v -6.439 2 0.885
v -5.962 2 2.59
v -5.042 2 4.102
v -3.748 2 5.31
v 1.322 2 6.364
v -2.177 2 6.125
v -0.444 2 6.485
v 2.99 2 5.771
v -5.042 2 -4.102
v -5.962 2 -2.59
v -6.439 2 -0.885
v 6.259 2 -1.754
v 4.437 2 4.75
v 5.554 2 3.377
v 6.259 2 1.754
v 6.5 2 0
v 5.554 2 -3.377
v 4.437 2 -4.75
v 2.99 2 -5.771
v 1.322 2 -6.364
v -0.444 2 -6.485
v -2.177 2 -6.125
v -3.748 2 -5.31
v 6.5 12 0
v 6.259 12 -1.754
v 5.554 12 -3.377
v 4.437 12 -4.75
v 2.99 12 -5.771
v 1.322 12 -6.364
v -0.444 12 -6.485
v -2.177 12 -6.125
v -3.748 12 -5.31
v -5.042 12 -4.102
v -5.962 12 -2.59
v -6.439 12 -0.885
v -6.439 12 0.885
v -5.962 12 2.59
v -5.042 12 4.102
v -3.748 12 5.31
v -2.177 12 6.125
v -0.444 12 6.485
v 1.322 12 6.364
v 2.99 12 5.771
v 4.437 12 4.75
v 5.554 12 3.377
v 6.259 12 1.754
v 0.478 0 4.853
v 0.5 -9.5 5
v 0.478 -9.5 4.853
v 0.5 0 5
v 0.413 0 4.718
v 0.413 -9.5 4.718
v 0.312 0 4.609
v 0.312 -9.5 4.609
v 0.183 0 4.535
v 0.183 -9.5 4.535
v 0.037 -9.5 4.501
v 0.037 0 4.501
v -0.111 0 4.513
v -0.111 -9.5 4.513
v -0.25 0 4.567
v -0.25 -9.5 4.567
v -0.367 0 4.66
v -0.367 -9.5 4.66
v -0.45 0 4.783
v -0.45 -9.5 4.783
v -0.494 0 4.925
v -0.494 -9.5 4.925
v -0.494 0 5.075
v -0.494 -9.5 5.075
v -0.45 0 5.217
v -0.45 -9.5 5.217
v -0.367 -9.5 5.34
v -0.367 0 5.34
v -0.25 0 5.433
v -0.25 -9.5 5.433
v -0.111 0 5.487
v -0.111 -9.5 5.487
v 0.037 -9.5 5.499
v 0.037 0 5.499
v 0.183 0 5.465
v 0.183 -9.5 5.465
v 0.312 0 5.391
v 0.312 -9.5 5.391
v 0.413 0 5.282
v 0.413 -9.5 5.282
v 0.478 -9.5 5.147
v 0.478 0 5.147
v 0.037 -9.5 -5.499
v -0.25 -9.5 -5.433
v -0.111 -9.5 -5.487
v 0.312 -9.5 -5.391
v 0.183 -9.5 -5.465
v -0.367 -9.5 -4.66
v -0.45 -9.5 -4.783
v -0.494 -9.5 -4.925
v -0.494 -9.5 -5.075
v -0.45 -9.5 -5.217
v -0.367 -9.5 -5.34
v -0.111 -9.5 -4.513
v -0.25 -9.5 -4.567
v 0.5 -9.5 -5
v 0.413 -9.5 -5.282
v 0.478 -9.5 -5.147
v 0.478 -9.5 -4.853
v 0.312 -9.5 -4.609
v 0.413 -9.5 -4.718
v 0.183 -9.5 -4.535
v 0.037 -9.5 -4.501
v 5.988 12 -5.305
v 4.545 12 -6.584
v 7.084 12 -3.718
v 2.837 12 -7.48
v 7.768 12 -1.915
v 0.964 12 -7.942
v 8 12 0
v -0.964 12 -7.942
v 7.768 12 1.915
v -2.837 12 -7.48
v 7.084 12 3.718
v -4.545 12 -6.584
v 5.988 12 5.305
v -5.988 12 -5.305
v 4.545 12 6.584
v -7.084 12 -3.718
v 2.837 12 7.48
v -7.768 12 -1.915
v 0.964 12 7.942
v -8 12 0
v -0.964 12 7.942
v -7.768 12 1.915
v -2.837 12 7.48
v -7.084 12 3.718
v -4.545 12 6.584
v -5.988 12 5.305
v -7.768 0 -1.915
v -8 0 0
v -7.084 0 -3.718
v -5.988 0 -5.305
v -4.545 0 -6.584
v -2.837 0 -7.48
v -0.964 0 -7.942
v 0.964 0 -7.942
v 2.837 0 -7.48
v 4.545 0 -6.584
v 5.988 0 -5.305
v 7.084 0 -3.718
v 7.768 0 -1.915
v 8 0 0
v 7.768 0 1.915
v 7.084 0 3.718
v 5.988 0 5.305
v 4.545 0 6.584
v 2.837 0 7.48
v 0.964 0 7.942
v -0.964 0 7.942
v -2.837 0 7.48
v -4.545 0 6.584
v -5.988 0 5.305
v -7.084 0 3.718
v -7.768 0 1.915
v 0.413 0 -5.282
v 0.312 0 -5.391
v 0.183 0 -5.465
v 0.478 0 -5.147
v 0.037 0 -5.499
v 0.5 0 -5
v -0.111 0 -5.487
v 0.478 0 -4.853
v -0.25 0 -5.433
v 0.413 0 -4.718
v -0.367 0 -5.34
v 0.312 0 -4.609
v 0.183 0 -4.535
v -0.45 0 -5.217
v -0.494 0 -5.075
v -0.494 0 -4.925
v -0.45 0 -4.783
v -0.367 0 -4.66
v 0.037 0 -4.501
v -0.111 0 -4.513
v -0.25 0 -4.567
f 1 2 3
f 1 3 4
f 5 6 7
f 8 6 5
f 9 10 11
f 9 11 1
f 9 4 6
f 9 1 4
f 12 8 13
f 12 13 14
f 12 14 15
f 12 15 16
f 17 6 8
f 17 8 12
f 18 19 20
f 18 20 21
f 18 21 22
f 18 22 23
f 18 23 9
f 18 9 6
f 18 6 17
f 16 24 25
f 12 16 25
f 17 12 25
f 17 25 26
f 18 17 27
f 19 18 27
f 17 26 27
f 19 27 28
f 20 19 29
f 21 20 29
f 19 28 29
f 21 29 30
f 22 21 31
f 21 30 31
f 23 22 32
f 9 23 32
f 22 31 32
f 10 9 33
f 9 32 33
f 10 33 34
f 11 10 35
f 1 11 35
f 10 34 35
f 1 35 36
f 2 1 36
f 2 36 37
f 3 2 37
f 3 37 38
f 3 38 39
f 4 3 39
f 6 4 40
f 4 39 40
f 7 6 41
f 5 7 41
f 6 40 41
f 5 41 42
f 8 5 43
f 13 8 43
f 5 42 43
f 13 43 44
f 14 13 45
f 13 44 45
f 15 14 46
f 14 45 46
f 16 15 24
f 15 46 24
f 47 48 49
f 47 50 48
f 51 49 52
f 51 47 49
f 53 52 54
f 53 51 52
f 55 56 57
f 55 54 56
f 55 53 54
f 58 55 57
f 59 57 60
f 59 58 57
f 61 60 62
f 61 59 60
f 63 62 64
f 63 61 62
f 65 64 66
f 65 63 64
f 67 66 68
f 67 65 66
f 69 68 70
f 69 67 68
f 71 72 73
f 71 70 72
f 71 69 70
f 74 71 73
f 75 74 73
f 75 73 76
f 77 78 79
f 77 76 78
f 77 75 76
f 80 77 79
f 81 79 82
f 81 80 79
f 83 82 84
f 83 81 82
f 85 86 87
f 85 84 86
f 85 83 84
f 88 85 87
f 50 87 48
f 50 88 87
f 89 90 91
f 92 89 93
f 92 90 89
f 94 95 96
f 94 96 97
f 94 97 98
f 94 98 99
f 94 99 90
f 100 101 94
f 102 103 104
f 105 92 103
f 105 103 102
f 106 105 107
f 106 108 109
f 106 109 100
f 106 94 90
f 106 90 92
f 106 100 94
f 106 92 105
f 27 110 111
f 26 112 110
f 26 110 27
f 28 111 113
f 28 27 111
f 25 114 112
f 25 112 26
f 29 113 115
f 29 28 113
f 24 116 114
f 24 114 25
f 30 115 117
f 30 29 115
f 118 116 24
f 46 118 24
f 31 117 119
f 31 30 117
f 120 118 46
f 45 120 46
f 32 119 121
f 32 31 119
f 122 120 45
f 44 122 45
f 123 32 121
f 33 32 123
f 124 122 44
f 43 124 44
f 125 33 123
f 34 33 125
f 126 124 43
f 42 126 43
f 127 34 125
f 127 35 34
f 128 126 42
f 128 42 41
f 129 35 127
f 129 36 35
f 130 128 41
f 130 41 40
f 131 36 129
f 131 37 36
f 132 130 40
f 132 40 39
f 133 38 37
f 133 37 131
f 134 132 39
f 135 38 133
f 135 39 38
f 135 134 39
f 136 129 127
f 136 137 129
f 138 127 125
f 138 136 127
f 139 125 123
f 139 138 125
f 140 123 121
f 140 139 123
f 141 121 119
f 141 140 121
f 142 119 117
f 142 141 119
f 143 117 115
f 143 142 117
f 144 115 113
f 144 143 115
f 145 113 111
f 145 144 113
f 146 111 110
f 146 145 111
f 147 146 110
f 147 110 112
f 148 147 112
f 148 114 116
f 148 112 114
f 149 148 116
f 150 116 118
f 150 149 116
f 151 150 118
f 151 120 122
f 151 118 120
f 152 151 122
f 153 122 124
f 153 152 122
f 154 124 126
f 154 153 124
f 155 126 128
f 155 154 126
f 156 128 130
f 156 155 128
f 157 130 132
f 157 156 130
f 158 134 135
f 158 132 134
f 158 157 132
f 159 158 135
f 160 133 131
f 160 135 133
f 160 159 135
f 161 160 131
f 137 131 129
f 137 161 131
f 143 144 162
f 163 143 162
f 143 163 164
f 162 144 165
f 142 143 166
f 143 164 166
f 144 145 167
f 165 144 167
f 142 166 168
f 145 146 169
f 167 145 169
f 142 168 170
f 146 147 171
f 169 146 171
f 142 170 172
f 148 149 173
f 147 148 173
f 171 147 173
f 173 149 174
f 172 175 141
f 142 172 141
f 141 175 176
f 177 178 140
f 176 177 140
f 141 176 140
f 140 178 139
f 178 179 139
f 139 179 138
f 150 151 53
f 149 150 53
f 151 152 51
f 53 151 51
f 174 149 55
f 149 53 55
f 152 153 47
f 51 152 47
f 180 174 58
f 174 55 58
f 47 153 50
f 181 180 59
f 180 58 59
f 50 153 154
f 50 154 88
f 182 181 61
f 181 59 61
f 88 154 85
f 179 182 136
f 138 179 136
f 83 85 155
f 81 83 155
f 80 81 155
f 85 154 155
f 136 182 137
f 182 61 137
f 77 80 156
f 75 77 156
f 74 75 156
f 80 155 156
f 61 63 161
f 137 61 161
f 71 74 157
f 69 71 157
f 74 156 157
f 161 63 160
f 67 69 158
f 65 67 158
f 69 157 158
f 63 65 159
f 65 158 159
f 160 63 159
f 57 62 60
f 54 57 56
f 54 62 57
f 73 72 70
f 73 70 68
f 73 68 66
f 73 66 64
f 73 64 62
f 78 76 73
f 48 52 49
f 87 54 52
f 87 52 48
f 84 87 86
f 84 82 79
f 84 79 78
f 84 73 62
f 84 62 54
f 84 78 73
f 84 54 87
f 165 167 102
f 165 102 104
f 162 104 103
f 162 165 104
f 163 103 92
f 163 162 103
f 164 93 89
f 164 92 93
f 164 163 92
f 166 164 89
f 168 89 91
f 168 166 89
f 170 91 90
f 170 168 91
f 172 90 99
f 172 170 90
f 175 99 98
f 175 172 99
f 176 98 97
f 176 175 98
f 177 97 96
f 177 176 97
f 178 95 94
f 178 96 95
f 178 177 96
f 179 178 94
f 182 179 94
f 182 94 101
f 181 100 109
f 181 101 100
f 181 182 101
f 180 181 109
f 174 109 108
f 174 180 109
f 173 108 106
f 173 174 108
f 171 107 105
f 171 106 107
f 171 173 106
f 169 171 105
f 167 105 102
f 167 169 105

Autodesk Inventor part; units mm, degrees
ref_plane "YZ Plane" through (0, 0, 0) normal (1, 0, 0) x (0, 1, 0)
ref_plane "XZ Plane" through (0, 0, 0) normal (0, 1, 0) x (-1, 0, 0)
ref_plane "XY Plane" through (0, 0, 0) normal (0, 0, 1) x (1, 0, 0)
sketch "Sketch1" plane through (0, 0, 0) normal (0, 1, 0) x (-1, 0, 0)
  line L0 (0, -11.2) -> (0, 11.2) construction
  line L1 (-11.2, 0) -> (11.2, 0) construction
  circle A0 centre (0, 0) radius 8
  dimension "d0" = 16
extrude "Extrusion1" add sketch "Sketch1" along normal blind 12
sketch "Sketch2" plane through (0, 12, 0) normal (0, 1, 0) x (1, 0, 0)
  circle A0 centre (0, 0) radius 6.5
  dimension "d3" = 13
extrude "Extrusion2" cut sketch "Sketch2" against normal blind 10
sketch "Sketch4" plane through (0, 0, 0) normal (0, -1, 0) x (1, 0, 0)
  line L0 (0, 11.2) -> (0, -11.2) construction
  line L1 (-11.2, 0) -> (11.2, 0) construction
  circle A0 centre (0, 5) radius 0.5
  circle A1 centre (0, -5) radius 0.5
  point P0 (0, 0)
  dimension "d39" = 1
  dimension "d40" = 1
  dimension "d41" = 10
extrude "Extrusion4" add sketch "Sketch4" along normal blind 9.5
equation "\"d40\" = d39"
properties part number "transducer"
